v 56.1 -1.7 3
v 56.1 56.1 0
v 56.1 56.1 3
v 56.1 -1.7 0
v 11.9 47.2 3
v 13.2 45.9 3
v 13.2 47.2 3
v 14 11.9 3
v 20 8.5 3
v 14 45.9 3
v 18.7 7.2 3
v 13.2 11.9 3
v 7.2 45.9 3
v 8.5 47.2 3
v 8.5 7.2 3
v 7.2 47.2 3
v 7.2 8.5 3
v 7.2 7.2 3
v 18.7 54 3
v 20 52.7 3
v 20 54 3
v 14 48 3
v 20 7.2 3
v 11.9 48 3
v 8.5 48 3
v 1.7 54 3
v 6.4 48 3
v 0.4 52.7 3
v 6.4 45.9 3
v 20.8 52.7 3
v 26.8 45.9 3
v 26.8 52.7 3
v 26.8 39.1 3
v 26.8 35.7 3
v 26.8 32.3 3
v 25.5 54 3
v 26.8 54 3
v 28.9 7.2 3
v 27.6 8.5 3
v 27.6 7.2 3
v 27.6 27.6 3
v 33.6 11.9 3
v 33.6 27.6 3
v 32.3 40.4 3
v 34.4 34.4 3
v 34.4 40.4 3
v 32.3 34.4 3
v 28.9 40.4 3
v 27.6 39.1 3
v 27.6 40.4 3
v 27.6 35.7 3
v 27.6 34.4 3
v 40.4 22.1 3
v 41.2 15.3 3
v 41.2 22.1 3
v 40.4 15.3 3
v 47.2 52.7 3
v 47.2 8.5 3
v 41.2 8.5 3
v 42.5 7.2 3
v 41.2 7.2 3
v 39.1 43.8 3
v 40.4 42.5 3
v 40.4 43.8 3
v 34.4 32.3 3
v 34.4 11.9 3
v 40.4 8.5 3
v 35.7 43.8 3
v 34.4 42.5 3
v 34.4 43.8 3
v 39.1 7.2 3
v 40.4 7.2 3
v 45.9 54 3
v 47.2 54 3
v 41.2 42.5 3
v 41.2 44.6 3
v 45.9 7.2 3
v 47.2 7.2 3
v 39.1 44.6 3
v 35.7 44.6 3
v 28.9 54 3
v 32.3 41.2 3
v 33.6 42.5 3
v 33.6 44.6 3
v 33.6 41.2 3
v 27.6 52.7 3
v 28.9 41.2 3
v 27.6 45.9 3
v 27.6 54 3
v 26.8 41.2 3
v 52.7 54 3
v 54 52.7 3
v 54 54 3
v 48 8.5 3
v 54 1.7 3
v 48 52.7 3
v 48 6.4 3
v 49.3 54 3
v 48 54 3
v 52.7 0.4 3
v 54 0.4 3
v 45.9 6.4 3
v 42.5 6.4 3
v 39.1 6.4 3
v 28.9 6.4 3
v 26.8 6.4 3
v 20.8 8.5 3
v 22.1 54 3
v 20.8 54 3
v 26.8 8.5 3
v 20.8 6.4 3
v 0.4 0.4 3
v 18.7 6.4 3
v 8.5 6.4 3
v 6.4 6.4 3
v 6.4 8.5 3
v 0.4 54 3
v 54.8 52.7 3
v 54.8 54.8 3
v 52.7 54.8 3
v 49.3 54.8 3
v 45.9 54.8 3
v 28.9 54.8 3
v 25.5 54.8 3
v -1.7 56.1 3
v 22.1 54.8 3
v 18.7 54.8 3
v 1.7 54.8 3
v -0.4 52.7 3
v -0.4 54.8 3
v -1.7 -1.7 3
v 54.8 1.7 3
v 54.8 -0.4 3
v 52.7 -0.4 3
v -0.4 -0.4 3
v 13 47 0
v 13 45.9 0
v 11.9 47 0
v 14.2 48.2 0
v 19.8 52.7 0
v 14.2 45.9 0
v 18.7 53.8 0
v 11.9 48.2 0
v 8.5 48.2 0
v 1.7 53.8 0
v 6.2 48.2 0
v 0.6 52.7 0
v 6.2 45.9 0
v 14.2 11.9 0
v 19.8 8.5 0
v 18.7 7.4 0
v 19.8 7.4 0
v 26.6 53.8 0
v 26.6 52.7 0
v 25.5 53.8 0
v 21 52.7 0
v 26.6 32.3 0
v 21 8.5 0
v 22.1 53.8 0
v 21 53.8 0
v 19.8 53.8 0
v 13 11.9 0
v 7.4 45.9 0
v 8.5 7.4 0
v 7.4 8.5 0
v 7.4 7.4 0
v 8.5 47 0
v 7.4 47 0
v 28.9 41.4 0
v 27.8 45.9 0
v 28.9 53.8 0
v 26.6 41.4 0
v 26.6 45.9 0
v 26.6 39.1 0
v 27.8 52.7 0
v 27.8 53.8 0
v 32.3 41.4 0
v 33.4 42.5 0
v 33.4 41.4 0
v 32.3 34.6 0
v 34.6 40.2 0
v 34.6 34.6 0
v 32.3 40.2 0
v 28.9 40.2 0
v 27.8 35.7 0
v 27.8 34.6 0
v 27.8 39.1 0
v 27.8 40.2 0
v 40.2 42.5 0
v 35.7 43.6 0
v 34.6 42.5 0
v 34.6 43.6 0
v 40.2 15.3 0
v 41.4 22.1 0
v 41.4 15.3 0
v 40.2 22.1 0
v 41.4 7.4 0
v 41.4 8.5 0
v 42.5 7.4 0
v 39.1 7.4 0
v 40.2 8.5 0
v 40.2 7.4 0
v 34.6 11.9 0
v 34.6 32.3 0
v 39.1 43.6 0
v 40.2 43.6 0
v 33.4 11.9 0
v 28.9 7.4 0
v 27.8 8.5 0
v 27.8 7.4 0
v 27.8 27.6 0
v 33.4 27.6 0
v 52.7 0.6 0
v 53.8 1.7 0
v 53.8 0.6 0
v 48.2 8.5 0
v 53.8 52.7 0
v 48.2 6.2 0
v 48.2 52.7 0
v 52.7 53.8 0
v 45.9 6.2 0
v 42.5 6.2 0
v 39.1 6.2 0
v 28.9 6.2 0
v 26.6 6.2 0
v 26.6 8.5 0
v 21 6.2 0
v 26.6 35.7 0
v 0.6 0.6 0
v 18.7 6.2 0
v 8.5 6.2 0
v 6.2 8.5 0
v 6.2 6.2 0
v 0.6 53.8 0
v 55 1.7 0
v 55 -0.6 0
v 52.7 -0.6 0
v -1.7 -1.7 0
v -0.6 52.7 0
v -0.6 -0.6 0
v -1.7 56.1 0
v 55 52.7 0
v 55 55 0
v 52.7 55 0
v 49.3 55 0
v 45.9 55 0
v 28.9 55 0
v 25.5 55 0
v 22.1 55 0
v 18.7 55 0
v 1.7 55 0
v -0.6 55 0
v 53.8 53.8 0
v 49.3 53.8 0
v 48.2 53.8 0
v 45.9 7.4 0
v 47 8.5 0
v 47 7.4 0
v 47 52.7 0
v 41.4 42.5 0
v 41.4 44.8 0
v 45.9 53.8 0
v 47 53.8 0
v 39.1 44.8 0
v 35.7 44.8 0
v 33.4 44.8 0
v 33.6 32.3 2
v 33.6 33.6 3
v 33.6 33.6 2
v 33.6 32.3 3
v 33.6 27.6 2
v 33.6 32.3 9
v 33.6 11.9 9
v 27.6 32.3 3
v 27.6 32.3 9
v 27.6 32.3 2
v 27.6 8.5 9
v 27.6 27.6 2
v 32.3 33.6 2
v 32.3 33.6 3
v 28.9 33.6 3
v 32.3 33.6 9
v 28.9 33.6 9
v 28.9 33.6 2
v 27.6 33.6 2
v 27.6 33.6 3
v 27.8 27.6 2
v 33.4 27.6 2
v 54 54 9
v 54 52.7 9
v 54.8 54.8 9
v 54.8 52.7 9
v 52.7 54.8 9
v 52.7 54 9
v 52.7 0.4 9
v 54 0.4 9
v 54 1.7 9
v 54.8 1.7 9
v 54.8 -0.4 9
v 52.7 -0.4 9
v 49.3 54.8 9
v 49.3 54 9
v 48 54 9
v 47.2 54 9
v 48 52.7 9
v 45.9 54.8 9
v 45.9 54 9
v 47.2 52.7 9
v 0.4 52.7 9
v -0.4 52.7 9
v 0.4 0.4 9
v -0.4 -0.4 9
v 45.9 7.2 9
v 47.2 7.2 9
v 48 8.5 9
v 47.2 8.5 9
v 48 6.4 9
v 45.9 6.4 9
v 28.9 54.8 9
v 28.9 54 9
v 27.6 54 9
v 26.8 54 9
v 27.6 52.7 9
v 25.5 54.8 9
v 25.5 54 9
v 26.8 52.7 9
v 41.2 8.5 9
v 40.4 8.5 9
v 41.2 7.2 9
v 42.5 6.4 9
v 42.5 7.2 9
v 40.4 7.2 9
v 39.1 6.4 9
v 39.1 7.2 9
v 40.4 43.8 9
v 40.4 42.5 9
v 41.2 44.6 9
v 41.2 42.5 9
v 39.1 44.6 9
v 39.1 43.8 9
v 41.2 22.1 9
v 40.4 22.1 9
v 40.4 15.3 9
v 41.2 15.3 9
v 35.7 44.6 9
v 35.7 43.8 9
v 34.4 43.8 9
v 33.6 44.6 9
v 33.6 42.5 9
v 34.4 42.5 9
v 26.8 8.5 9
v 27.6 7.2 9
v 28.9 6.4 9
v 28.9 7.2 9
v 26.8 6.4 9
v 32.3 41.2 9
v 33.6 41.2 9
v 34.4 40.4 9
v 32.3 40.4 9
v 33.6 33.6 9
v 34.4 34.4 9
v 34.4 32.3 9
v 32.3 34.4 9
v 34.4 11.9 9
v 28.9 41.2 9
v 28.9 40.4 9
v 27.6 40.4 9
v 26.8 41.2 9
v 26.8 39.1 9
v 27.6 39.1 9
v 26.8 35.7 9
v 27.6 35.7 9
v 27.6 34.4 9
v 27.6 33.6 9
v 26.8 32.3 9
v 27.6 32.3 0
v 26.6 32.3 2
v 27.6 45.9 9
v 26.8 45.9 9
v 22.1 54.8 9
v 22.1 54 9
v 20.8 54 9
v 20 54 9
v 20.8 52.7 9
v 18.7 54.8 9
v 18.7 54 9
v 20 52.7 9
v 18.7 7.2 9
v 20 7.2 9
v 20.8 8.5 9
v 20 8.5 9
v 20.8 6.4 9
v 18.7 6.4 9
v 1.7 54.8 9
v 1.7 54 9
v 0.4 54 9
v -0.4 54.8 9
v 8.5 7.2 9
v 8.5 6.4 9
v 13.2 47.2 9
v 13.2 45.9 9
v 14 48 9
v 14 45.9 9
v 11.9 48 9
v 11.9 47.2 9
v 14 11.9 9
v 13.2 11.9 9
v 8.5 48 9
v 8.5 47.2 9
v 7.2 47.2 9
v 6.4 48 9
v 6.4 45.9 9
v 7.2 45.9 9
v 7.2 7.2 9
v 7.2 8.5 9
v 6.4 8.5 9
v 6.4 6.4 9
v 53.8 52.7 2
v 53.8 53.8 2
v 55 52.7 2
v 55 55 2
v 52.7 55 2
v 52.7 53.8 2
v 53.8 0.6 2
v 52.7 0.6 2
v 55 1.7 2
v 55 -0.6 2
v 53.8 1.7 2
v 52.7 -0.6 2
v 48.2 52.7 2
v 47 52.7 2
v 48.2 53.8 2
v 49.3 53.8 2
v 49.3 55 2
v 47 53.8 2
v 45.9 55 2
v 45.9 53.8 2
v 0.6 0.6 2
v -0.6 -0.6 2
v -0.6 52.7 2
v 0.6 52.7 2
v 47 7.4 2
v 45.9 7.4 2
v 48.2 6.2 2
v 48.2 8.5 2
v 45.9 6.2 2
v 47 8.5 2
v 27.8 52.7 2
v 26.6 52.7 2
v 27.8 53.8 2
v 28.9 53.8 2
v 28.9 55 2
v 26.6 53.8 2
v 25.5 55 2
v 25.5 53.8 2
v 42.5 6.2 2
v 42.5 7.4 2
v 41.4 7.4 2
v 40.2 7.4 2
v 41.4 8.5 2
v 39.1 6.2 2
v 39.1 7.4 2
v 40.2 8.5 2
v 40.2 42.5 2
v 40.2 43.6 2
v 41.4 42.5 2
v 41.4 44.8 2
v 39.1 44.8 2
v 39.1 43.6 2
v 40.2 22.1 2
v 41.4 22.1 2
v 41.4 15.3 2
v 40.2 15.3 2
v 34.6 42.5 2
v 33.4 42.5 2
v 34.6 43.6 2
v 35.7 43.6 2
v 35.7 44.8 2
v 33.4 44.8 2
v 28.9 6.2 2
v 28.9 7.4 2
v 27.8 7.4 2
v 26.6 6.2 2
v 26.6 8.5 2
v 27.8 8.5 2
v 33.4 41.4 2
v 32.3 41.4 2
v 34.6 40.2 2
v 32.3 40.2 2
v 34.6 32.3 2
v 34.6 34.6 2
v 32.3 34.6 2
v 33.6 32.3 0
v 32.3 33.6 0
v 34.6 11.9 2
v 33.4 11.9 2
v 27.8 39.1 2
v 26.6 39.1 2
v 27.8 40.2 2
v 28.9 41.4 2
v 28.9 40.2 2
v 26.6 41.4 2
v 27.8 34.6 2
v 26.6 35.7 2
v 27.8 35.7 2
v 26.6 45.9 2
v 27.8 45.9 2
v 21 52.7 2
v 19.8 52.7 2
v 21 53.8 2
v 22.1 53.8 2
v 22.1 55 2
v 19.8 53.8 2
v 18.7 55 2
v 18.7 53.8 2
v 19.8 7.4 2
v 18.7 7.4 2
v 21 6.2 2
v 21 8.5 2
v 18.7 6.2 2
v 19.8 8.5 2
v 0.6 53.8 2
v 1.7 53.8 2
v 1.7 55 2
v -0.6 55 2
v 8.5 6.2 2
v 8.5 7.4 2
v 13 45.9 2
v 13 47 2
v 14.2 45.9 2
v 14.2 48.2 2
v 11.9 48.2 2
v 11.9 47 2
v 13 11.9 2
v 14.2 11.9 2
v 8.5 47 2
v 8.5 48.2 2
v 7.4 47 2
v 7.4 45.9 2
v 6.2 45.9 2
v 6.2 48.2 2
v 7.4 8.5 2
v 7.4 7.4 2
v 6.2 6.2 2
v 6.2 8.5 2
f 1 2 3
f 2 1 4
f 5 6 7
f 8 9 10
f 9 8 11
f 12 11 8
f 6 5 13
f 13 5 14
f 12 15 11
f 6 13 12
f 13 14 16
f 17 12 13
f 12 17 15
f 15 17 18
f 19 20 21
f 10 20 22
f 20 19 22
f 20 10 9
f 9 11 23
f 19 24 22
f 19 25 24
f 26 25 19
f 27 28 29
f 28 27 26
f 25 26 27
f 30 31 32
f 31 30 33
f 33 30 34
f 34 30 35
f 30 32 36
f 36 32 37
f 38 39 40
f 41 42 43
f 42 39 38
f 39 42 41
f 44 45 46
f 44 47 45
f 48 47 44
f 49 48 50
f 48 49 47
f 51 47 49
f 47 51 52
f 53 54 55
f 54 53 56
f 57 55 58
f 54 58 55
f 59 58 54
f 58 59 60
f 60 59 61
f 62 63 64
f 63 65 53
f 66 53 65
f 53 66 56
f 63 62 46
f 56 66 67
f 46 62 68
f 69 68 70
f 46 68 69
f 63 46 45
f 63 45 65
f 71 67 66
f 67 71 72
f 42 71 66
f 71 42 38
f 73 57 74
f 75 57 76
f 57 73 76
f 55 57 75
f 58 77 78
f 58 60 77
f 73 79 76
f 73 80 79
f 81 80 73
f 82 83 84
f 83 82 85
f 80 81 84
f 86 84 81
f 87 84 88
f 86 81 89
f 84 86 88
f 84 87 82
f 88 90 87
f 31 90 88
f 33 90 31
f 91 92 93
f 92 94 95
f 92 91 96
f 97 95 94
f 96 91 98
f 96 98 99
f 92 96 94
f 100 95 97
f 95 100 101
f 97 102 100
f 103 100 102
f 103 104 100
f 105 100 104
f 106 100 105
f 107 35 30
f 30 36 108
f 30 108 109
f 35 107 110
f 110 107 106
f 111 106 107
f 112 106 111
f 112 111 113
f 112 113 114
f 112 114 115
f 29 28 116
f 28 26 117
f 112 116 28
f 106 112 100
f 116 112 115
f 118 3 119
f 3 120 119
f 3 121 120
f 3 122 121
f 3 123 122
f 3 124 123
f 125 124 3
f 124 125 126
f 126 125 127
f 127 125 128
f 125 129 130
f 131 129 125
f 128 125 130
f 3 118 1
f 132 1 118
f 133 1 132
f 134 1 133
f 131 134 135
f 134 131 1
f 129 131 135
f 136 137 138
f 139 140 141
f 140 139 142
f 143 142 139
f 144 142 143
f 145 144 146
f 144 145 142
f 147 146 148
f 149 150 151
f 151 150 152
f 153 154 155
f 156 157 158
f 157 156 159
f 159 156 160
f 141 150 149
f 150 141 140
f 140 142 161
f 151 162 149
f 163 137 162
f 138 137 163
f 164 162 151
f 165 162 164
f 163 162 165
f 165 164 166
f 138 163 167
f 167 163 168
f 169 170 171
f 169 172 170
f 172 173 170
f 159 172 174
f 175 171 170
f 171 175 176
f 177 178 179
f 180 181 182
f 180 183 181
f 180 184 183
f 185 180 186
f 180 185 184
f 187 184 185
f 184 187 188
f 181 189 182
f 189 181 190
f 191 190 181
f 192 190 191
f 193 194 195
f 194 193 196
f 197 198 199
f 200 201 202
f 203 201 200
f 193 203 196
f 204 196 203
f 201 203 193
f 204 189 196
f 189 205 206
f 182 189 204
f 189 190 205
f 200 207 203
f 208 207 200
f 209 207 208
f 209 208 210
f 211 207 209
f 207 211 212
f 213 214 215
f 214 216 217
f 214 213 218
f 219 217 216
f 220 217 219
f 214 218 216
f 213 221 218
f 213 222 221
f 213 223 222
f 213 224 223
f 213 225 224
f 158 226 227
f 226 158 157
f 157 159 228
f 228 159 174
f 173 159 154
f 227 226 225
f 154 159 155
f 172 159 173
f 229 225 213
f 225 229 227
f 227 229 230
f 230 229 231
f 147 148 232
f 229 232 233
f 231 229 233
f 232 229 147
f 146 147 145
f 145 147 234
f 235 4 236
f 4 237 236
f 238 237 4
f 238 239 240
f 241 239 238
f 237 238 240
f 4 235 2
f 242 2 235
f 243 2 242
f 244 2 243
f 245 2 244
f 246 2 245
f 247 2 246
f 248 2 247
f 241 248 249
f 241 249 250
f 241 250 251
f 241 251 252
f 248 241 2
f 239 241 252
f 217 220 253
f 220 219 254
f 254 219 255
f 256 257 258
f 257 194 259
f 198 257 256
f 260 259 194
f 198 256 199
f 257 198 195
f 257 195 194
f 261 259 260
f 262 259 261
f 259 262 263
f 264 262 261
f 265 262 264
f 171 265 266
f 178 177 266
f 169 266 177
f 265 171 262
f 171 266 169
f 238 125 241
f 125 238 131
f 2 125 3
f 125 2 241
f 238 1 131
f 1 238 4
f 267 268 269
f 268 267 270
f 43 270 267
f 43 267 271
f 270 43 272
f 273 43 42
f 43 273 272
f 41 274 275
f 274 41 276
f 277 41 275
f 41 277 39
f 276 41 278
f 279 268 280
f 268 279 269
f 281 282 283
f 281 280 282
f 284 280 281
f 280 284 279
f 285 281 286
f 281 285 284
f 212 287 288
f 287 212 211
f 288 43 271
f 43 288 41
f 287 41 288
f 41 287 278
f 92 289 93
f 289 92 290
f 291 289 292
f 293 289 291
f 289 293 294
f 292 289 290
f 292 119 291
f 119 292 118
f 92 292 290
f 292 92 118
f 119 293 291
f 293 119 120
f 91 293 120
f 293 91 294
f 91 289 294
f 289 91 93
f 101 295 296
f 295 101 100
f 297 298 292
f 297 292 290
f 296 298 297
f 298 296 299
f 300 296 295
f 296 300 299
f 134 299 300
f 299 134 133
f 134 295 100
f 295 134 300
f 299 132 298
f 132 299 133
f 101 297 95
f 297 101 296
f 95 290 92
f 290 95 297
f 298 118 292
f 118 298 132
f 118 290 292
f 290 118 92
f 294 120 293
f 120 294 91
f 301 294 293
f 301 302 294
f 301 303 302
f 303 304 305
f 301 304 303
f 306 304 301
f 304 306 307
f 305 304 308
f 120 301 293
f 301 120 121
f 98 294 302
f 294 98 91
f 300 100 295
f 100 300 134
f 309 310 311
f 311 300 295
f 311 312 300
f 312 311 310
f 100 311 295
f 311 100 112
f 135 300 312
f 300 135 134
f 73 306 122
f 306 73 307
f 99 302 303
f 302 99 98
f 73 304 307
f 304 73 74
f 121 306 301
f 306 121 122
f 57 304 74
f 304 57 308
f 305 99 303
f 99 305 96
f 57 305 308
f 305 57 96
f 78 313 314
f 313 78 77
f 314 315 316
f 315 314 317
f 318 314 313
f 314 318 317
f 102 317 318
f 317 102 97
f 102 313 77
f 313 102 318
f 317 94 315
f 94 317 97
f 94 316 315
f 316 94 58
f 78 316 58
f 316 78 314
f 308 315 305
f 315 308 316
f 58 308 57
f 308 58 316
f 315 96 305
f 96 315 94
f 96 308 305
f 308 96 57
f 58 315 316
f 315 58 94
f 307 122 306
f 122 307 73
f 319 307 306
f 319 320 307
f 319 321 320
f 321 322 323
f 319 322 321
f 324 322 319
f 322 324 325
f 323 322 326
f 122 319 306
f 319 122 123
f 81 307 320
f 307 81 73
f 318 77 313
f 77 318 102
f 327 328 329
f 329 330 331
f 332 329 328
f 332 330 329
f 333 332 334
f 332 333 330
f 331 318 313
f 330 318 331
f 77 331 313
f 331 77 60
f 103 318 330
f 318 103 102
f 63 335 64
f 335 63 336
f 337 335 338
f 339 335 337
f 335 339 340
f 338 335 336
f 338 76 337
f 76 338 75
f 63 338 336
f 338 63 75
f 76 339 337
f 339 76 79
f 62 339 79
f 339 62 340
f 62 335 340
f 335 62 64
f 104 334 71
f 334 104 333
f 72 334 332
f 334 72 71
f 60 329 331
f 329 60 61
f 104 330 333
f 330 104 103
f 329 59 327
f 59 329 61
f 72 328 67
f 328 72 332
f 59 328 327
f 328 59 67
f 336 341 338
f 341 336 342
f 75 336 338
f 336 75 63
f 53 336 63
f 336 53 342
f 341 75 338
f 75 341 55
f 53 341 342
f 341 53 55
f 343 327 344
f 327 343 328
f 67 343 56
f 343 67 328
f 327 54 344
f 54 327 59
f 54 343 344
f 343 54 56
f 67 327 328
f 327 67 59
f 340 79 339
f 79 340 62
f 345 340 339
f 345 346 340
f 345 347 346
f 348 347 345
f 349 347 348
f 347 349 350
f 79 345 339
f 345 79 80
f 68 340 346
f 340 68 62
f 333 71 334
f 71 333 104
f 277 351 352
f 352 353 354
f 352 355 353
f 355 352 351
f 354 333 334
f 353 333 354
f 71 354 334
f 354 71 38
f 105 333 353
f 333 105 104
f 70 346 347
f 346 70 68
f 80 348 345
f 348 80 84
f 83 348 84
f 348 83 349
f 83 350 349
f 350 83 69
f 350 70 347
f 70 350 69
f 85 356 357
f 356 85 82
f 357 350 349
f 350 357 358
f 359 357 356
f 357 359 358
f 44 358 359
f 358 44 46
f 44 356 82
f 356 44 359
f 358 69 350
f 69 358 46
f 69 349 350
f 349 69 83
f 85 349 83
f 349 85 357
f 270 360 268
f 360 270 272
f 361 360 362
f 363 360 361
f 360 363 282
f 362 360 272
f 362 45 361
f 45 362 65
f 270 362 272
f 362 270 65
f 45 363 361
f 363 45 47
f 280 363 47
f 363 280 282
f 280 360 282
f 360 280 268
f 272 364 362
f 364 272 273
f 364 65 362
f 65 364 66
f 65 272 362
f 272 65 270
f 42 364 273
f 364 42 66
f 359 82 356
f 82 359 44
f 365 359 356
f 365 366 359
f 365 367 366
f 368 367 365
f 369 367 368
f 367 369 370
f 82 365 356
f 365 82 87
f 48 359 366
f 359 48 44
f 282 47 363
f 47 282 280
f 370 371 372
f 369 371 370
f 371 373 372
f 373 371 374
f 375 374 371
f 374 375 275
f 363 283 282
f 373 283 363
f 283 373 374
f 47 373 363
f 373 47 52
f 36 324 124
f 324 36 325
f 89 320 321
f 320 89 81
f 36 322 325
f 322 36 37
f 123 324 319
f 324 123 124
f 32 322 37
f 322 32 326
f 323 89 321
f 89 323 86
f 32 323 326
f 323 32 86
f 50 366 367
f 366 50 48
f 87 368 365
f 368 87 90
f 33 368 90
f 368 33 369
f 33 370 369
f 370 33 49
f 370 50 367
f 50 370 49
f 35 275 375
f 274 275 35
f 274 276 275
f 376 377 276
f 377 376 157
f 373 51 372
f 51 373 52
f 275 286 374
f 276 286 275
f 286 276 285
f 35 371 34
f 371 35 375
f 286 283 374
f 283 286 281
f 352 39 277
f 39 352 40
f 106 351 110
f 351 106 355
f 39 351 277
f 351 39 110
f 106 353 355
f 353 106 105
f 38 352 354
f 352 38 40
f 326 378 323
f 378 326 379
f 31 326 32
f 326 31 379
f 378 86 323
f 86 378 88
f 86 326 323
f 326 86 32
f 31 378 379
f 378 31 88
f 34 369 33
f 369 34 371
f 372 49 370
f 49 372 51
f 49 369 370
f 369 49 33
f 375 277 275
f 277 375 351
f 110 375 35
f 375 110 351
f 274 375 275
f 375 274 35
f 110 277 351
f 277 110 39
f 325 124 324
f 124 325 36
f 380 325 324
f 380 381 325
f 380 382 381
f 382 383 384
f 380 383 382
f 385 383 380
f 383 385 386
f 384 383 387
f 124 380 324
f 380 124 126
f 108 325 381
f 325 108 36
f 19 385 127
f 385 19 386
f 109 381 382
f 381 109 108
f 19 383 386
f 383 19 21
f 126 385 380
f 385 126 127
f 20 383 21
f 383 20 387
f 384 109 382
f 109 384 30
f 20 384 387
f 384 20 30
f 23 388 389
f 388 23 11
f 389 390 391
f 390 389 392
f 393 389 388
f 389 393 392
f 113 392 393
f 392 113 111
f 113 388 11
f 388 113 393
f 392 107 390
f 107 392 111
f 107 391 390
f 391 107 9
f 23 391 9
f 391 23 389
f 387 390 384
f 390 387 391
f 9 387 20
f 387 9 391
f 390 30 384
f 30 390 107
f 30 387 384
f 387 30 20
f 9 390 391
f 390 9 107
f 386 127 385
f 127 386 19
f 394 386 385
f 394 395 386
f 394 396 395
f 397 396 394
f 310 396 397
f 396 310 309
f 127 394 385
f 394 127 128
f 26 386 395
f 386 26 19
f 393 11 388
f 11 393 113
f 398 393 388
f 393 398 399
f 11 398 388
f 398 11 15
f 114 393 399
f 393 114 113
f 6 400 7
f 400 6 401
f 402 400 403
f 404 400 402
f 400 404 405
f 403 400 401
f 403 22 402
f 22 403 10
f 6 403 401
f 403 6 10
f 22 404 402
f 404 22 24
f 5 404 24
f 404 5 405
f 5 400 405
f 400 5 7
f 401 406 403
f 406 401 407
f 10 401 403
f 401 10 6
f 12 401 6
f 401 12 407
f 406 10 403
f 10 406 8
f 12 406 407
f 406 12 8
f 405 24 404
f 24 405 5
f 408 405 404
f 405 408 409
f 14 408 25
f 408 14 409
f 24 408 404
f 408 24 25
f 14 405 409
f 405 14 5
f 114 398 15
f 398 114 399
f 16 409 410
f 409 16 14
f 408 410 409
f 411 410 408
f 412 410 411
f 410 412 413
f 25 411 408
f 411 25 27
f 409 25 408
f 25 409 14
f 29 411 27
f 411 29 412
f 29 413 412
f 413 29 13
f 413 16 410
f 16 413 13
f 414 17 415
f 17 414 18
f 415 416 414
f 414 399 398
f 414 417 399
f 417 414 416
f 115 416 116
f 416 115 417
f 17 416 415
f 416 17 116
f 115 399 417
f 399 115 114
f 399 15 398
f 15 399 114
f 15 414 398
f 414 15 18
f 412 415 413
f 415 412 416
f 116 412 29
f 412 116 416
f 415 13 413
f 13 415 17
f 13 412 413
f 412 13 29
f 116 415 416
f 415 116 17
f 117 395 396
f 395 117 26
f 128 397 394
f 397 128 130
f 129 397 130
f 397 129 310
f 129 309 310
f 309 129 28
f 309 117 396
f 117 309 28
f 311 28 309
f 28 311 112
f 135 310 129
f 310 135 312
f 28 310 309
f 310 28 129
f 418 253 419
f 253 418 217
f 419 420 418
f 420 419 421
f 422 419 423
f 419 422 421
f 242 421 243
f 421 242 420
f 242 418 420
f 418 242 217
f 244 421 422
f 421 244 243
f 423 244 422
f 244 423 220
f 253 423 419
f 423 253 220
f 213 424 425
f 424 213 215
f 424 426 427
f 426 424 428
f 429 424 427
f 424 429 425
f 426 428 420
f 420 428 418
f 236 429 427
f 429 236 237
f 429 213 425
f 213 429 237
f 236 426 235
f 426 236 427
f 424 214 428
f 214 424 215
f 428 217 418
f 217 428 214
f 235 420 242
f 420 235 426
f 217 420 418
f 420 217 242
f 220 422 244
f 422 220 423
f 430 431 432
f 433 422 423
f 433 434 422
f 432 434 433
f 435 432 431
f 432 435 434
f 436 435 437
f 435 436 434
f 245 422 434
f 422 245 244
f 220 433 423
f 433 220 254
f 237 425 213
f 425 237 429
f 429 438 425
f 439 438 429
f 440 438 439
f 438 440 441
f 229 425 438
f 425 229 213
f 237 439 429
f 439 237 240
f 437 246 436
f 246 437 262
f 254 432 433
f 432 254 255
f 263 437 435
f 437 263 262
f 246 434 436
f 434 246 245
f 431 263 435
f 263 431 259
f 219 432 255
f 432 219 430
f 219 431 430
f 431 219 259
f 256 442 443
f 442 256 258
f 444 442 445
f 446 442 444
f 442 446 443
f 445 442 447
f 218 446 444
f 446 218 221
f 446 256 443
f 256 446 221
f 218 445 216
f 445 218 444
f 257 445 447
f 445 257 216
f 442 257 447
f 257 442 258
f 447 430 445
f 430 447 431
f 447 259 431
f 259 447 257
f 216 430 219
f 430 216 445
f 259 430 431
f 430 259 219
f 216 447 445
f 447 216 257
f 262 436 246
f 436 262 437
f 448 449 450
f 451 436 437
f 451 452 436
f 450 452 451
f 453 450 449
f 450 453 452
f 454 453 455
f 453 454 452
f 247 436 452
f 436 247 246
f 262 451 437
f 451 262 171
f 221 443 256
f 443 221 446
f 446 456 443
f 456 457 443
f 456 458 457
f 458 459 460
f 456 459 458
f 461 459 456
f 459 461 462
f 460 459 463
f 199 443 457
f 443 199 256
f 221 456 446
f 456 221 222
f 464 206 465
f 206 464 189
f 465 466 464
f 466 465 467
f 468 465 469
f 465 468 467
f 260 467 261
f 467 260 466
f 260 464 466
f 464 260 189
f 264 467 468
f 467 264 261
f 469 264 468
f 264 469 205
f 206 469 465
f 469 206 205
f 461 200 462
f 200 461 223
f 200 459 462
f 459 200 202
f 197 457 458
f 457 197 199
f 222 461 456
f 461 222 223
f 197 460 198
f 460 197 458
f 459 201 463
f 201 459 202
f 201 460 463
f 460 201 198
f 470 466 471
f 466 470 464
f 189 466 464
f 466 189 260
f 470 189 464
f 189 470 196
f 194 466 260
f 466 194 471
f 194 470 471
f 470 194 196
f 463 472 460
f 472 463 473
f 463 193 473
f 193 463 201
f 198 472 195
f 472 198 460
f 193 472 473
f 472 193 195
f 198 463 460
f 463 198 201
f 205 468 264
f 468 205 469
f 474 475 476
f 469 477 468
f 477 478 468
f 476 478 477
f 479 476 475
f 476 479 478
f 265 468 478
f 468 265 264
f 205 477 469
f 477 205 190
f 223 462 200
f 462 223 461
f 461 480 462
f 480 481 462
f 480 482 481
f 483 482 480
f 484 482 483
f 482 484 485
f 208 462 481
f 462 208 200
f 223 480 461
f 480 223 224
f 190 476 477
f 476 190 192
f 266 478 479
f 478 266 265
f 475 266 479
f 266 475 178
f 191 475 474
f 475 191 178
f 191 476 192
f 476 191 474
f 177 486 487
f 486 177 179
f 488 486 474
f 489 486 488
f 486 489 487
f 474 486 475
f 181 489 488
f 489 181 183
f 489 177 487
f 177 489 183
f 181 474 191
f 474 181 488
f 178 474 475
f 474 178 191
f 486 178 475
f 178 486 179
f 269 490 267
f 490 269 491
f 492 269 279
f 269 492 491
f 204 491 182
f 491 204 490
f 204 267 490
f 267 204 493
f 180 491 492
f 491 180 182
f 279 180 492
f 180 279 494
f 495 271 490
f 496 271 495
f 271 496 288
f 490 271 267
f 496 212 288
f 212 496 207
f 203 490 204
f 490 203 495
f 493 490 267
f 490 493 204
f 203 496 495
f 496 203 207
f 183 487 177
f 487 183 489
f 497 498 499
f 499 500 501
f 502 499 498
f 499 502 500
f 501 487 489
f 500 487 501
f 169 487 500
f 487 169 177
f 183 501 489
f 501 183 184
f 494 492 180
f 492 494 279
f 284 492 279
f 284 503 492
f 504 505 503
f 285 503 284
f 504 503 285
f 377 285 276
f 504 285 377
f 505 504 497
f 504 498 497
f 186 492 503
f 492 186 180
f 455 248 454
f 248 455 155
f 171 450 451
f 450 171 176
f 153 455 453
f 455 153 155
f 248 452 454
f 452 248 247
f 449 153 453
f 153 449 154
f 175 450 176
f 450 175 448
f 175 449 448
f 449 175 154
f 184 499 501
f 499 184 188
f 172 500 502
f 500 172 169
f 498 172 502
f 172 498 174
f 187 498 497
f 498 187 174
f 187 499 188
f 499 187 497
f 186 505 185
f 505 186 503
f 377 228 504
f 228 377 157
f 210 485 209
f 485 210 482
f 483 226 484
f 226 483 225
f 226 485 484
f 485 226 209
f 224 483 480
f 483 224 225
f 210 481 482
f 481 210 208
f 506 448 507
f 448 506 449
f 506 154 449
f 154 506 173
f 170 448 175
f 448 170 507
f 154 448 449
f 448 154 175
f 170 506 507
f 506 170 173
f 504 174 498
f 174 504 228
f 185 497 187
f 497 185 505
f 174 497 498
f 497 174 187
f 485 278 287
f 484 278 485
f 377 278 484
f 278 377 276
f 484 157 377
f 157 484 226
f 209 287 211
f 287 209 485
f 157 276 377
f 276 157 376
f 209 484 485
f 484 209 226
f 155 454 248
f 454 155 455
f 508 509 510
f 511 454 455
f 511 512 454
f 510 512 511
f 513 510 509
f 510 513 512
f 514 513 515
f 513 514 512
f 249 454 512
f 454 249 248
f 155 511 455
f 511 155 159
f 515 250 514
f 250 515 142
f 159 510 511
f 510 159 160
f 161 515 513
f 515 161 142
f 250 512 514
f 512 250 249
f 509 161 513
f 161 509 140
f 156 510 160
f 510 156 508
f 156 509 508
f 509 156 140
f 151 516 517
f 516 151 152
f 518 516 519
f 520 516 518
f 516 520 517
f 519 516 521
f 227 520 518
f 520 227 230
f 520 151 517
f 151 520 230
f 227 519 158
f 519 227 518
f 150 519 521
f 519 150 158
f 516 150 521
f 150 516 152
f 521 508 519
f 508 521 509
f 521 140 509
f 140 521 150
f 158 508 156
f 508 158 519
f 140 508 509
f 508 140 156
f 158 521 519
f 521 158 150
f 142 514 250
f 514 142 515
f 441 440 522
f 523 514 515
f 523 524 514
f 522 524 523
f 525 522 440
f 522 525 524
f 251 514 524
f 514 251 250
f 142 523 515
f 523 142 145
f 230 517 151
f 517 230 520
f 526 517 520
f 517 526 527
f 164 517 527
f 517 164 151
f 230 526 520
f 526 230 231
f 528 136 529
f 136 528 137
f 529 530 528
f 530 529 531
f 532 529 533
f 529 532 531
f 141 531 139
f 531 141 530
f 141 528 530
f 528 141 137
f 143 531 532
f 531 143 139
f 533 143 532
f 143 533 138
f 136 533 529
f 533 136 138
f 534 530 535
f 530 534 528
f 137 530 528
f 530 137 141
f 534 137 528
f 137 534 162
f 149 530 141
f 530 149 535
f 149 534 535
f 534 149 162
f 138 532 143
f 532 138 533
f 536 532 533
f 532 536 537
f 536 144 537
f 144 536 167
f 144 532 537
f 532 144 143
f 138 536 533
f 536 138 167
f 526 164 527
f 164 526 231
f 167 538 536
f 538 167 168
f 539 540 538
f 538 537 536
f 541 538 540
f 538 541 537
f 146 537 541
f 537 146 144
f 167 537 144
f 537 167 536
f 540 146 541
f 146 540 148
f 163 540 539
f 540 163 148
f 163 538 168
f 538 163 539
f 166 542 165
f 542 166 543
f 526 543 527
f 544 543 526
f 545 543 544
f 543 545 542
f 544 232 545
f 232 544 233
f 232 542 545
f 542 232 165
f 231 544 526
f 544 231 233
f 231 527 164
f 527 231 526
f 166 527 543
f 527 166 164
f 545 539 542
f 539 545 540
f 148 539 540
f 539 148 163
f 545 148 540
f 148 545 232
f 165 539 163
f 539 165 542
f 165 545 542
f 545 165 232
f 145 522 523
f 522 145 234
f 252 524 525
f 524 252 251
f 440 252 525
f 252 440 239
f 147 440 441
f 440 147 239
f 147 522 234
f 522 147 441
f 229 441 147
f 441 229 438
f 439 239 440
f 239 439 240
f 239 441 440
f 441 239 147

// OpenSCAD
// DRAW LABYRINTH

// These module is defined below all other configuration details
//labyrinth(cube8x8level4);
labyrinthLevels(cube8x8level4, cube8x8level3);


// DRAWING SYMBOLS
WALL_VERTICAL = "|";
WALL_HORIZONTAL = "─";

CORNER_PLUS="+";

CORNER_TOP_LEFT="┌";
CORNER_TOP_RIGHT= "┐";
CORNER_BOTTOM_RIGHT="┘";
CORNER_BOTTOM_LEFT="└";

CORNER_T="┬";
CORNER_T_DOWN="┴";
CORNER_T_LEFT="├";
CORNER_T_RIGHT="┤";

SPACE = " ";
HOLE = "X";


// LEVEL DRAWING TEMPLATE

LEVEL0 = concat(
"┌─────┐",
"|     |",
"| ┌┬┐ |",
"| ├+┤ |",
"| └┴┘ |",
"|     |",
"└─────┘");


// LEVEL DRAWINGS

LEVEL1 = concat(
"┌─────┐",
"|     |",
"├───┐ |",
"|  X| |",
"| ──┘ |",
"|     |",
"└─────┘");

LEVEL2 = concat(
"┌─────┐",
"|    X|",
"| ┌───┤",
"| |O  |",
"| └── |",
"|     |",
"└─────┘");

cube8x8level1 = concat(
"┌───────────────┐",
"|O              |",
"├─────────────┐ |",
"|             | |",
"|  ┌──────  ──┤ |",
"|  |          | |",
"|  └┐ ┌────── | |",
"|   | |X      | |",
"├── └─┴───────┘ |",
"|               |",
"├─────────────┐ |",
"|             | |",
"| ┌────────── | |",
"| |           | |",
"| └───────────┘ |",
"|               |",
"└───────────────┘");
cube8x8level2 = concat(
"┌───────────────┐",
"|X              |",
"├─────────────┐ |",
"|             | |",
"|  ┌──────  ──┤ |",
"|  |          | |",
"|  └┐ ┌────── | |",
"|   | |O      | |",
"├── └─┴───────┘ |",
"|               |",
"├─────────────┐ |",
"|             | |",
"| ┌────────── | |",
"| |           | |",
"| └───────────┘ |",
"|               |",
"└───────────────┘");
cube8x8level3 = concat(
"┌───────────────┐",
"|O              |",
"├─────────────┐ |",
"|             | |",
"|  ┌──────  ──┤ |",
"|  |          | |",
"|  └┐ ┌────── | |",
"|   | |       | |",
"├── └─┴───────┘ |",
"|               |",
"├─────────────┐ |",
"|             | |",
"| ┌────────── | |",
"| |X          | |",
"| └───────────┘ |",
"|               |",
"└───────────────┘");
cube8x8level4 = concat(
"┌───────────────┐",
"|               |",
"├─────────────┐ |",
"|             | |",
"|  ┌──────  ──┤ |",
"|  |          | |",
"|  └┐ ┌────── | |",
"|   | |X      | |",
"├── └─┴───────┘ |",
"|               |",
"├─────────────┐ |",
"|             | |",
"| ┌────────── | |",
"| |O          | |",
"| └───────────┘ |",
"|               |",
"└───────────────┘");



// PARAMETERS
ballSize = 6;

levelOverlap = 2; // how much below level should go into the bottom plate
bpt = levelOverlap+1; // bottom plate thickness
wallThickness = 0.8; // wall thickness
wh = ballSize+bpt; // wall height


// VARIABLES
w = ballSize/2+wallThickness/2; // width of the cell


// HELPER METHODS
module labyrinthLevels(currentLevel, levelBelow) {
    difference() {
        labyrinth(currentLevel);
        translate([0,0,-wh+levelOverlap])
            labyrinth(levelBelow, wallThickness*1.5);
    }
}

module labyrinth(lab, wallThickness = wallThickness) {
    bottom(lab);
    walls(lab, wallThickness);
}

module bottom(lab) {
    sw=len(lab[0]);
    boardSize = sw*w;
    difference() {
        translate([-w/2,-w/2,0])
            cube([boardSize, boardSize, bpt]);
        holes(lab);
    }
}

module walls(lab, wallThickness=wallThickness) {
    sw=len(lab[0]);
    for(x=[0:sw-1]) {
        for(y=[0:sw-1]) {
            cell = lab[x][y];
            tx=sw-x-1; ty=sw-y-1;
            translate([tx*w, ty*w, 0]) {
                if (cell == WALL_VERTICAL) {
                    wallVertical(wallThickness);
                } else if (cell == WALL_HORIZONTAL) {
                    wallHorizontal(wallThickness);
                } else if (cell == CORNER_TOP_LEFT) {
                    cornerTopLeft(wallThickness);
                } else if (cell == CORNER_TOP_RIGHT) {
                    cornerTopRight(wallThickness);
                } else if (cell == CORNER_BOTTOM_RIGHT) {
                    cornerBottomRight(wallThickness);
                } else if (cell == CORNER_BOTTOM_LEFT) {
                    cornerBottomLeft(wallThickness);
                } else if (cell == CORNER_T) {
                    cornerT();
                } else if (cell == CORNER_T_RIGHT) {
                    cornerTRight(wallThickness);
                } else if (cell == CORNER_T_DOWN) {
                    cornerTDown(wallThickness);
                } else if (cell == CORNER_T_LEFT) {
                    cornerTLeft(wallThickness);
                } else if (cell == CORNER_PLUS) {
                    cornerPlus(wallThickness);
                }
            }
        }
    }
}

module holes(lab) {
    sw=len(lab[0]);
    for(x=[0:sw-1]) {
        for(y=[0:sw-1]) {
            cell = lab[x][y];
            if (cell == HOLE) {
                tx=sw-x-1; ty=sw-y-1;
                translate([tx*w, ty*w, 0]) {
                    hole();
                }
            }
        }
    }
}

module hole() {
    s=w+w-wallThickness;
    translate([-s/2,-s/2, -1])
        cube([s, s, bpt+2]);
}

module wallHorizontal(wallThickness) {
    rotate([0,0,90])
        wall(wallThickness);
}

module wallVertical(wallThickness) {
    wall(wallThickness);
}

module wall(wallThickness) {
    translate([-w/2,-wallThickness/2, 0])
        cube([w, wallThickness, wh]);
}

module cornerTopLeft(wallThickness) {
    rotate([0,0,180])
        corner(wallThickness);
}
module cornerTopRight(wallThickness) {
    rotate([0,0,90])
        corner(wallThickness);
}
module cornerBottomRight(wallThickness) {
    corner(wallThickness);
}
module cornerBottomLeft(wallThickness) {
    rotate([0,0,270])
        corner(wallThickness);
}

module corner(wallThickness) {
    translate([-wallThickness/2,-wallThickness/2,0])
        cube([wallThickness, w/2+wallThickness/2, wh]);
    translate([-wallThickness/2,-wallThickness/2, 0])
        cube([w/2+wallThickness/2, wallThickness, wh]);
}

module cornerPlus(wallThickness) {
    translate([-w/2,-wallThickness/2, 0])
        cube([w, wallThickness, wh]);    
    translate([-wallThickness/2,-w/2,0])
        cube([wallThickness, w, wh]);
}

module cornerT(wallThickness) {
    rotate([0,0,90]) {
        translate([-w/2,-wallThickness/2, 0])
            cube([w, wallThickness, wh]);    
        translate([-wallThickness/2,-wallThickness/2,0])
            cube([wallThickness, w/2+wallThickness/2, wh]);
    }
}

module cornerTRight(wallThickness) {
    rotate([0,0,270])
        cornerT(wallThickness);
}

module cornerTDown(wallThickness) {
    rotate([0,0,180])
        cornerT(wallThickness);
}

module cornerTLeft(wallThickness) {
    rotate([0,0,90])
        cornerT(wallThickness);
}
